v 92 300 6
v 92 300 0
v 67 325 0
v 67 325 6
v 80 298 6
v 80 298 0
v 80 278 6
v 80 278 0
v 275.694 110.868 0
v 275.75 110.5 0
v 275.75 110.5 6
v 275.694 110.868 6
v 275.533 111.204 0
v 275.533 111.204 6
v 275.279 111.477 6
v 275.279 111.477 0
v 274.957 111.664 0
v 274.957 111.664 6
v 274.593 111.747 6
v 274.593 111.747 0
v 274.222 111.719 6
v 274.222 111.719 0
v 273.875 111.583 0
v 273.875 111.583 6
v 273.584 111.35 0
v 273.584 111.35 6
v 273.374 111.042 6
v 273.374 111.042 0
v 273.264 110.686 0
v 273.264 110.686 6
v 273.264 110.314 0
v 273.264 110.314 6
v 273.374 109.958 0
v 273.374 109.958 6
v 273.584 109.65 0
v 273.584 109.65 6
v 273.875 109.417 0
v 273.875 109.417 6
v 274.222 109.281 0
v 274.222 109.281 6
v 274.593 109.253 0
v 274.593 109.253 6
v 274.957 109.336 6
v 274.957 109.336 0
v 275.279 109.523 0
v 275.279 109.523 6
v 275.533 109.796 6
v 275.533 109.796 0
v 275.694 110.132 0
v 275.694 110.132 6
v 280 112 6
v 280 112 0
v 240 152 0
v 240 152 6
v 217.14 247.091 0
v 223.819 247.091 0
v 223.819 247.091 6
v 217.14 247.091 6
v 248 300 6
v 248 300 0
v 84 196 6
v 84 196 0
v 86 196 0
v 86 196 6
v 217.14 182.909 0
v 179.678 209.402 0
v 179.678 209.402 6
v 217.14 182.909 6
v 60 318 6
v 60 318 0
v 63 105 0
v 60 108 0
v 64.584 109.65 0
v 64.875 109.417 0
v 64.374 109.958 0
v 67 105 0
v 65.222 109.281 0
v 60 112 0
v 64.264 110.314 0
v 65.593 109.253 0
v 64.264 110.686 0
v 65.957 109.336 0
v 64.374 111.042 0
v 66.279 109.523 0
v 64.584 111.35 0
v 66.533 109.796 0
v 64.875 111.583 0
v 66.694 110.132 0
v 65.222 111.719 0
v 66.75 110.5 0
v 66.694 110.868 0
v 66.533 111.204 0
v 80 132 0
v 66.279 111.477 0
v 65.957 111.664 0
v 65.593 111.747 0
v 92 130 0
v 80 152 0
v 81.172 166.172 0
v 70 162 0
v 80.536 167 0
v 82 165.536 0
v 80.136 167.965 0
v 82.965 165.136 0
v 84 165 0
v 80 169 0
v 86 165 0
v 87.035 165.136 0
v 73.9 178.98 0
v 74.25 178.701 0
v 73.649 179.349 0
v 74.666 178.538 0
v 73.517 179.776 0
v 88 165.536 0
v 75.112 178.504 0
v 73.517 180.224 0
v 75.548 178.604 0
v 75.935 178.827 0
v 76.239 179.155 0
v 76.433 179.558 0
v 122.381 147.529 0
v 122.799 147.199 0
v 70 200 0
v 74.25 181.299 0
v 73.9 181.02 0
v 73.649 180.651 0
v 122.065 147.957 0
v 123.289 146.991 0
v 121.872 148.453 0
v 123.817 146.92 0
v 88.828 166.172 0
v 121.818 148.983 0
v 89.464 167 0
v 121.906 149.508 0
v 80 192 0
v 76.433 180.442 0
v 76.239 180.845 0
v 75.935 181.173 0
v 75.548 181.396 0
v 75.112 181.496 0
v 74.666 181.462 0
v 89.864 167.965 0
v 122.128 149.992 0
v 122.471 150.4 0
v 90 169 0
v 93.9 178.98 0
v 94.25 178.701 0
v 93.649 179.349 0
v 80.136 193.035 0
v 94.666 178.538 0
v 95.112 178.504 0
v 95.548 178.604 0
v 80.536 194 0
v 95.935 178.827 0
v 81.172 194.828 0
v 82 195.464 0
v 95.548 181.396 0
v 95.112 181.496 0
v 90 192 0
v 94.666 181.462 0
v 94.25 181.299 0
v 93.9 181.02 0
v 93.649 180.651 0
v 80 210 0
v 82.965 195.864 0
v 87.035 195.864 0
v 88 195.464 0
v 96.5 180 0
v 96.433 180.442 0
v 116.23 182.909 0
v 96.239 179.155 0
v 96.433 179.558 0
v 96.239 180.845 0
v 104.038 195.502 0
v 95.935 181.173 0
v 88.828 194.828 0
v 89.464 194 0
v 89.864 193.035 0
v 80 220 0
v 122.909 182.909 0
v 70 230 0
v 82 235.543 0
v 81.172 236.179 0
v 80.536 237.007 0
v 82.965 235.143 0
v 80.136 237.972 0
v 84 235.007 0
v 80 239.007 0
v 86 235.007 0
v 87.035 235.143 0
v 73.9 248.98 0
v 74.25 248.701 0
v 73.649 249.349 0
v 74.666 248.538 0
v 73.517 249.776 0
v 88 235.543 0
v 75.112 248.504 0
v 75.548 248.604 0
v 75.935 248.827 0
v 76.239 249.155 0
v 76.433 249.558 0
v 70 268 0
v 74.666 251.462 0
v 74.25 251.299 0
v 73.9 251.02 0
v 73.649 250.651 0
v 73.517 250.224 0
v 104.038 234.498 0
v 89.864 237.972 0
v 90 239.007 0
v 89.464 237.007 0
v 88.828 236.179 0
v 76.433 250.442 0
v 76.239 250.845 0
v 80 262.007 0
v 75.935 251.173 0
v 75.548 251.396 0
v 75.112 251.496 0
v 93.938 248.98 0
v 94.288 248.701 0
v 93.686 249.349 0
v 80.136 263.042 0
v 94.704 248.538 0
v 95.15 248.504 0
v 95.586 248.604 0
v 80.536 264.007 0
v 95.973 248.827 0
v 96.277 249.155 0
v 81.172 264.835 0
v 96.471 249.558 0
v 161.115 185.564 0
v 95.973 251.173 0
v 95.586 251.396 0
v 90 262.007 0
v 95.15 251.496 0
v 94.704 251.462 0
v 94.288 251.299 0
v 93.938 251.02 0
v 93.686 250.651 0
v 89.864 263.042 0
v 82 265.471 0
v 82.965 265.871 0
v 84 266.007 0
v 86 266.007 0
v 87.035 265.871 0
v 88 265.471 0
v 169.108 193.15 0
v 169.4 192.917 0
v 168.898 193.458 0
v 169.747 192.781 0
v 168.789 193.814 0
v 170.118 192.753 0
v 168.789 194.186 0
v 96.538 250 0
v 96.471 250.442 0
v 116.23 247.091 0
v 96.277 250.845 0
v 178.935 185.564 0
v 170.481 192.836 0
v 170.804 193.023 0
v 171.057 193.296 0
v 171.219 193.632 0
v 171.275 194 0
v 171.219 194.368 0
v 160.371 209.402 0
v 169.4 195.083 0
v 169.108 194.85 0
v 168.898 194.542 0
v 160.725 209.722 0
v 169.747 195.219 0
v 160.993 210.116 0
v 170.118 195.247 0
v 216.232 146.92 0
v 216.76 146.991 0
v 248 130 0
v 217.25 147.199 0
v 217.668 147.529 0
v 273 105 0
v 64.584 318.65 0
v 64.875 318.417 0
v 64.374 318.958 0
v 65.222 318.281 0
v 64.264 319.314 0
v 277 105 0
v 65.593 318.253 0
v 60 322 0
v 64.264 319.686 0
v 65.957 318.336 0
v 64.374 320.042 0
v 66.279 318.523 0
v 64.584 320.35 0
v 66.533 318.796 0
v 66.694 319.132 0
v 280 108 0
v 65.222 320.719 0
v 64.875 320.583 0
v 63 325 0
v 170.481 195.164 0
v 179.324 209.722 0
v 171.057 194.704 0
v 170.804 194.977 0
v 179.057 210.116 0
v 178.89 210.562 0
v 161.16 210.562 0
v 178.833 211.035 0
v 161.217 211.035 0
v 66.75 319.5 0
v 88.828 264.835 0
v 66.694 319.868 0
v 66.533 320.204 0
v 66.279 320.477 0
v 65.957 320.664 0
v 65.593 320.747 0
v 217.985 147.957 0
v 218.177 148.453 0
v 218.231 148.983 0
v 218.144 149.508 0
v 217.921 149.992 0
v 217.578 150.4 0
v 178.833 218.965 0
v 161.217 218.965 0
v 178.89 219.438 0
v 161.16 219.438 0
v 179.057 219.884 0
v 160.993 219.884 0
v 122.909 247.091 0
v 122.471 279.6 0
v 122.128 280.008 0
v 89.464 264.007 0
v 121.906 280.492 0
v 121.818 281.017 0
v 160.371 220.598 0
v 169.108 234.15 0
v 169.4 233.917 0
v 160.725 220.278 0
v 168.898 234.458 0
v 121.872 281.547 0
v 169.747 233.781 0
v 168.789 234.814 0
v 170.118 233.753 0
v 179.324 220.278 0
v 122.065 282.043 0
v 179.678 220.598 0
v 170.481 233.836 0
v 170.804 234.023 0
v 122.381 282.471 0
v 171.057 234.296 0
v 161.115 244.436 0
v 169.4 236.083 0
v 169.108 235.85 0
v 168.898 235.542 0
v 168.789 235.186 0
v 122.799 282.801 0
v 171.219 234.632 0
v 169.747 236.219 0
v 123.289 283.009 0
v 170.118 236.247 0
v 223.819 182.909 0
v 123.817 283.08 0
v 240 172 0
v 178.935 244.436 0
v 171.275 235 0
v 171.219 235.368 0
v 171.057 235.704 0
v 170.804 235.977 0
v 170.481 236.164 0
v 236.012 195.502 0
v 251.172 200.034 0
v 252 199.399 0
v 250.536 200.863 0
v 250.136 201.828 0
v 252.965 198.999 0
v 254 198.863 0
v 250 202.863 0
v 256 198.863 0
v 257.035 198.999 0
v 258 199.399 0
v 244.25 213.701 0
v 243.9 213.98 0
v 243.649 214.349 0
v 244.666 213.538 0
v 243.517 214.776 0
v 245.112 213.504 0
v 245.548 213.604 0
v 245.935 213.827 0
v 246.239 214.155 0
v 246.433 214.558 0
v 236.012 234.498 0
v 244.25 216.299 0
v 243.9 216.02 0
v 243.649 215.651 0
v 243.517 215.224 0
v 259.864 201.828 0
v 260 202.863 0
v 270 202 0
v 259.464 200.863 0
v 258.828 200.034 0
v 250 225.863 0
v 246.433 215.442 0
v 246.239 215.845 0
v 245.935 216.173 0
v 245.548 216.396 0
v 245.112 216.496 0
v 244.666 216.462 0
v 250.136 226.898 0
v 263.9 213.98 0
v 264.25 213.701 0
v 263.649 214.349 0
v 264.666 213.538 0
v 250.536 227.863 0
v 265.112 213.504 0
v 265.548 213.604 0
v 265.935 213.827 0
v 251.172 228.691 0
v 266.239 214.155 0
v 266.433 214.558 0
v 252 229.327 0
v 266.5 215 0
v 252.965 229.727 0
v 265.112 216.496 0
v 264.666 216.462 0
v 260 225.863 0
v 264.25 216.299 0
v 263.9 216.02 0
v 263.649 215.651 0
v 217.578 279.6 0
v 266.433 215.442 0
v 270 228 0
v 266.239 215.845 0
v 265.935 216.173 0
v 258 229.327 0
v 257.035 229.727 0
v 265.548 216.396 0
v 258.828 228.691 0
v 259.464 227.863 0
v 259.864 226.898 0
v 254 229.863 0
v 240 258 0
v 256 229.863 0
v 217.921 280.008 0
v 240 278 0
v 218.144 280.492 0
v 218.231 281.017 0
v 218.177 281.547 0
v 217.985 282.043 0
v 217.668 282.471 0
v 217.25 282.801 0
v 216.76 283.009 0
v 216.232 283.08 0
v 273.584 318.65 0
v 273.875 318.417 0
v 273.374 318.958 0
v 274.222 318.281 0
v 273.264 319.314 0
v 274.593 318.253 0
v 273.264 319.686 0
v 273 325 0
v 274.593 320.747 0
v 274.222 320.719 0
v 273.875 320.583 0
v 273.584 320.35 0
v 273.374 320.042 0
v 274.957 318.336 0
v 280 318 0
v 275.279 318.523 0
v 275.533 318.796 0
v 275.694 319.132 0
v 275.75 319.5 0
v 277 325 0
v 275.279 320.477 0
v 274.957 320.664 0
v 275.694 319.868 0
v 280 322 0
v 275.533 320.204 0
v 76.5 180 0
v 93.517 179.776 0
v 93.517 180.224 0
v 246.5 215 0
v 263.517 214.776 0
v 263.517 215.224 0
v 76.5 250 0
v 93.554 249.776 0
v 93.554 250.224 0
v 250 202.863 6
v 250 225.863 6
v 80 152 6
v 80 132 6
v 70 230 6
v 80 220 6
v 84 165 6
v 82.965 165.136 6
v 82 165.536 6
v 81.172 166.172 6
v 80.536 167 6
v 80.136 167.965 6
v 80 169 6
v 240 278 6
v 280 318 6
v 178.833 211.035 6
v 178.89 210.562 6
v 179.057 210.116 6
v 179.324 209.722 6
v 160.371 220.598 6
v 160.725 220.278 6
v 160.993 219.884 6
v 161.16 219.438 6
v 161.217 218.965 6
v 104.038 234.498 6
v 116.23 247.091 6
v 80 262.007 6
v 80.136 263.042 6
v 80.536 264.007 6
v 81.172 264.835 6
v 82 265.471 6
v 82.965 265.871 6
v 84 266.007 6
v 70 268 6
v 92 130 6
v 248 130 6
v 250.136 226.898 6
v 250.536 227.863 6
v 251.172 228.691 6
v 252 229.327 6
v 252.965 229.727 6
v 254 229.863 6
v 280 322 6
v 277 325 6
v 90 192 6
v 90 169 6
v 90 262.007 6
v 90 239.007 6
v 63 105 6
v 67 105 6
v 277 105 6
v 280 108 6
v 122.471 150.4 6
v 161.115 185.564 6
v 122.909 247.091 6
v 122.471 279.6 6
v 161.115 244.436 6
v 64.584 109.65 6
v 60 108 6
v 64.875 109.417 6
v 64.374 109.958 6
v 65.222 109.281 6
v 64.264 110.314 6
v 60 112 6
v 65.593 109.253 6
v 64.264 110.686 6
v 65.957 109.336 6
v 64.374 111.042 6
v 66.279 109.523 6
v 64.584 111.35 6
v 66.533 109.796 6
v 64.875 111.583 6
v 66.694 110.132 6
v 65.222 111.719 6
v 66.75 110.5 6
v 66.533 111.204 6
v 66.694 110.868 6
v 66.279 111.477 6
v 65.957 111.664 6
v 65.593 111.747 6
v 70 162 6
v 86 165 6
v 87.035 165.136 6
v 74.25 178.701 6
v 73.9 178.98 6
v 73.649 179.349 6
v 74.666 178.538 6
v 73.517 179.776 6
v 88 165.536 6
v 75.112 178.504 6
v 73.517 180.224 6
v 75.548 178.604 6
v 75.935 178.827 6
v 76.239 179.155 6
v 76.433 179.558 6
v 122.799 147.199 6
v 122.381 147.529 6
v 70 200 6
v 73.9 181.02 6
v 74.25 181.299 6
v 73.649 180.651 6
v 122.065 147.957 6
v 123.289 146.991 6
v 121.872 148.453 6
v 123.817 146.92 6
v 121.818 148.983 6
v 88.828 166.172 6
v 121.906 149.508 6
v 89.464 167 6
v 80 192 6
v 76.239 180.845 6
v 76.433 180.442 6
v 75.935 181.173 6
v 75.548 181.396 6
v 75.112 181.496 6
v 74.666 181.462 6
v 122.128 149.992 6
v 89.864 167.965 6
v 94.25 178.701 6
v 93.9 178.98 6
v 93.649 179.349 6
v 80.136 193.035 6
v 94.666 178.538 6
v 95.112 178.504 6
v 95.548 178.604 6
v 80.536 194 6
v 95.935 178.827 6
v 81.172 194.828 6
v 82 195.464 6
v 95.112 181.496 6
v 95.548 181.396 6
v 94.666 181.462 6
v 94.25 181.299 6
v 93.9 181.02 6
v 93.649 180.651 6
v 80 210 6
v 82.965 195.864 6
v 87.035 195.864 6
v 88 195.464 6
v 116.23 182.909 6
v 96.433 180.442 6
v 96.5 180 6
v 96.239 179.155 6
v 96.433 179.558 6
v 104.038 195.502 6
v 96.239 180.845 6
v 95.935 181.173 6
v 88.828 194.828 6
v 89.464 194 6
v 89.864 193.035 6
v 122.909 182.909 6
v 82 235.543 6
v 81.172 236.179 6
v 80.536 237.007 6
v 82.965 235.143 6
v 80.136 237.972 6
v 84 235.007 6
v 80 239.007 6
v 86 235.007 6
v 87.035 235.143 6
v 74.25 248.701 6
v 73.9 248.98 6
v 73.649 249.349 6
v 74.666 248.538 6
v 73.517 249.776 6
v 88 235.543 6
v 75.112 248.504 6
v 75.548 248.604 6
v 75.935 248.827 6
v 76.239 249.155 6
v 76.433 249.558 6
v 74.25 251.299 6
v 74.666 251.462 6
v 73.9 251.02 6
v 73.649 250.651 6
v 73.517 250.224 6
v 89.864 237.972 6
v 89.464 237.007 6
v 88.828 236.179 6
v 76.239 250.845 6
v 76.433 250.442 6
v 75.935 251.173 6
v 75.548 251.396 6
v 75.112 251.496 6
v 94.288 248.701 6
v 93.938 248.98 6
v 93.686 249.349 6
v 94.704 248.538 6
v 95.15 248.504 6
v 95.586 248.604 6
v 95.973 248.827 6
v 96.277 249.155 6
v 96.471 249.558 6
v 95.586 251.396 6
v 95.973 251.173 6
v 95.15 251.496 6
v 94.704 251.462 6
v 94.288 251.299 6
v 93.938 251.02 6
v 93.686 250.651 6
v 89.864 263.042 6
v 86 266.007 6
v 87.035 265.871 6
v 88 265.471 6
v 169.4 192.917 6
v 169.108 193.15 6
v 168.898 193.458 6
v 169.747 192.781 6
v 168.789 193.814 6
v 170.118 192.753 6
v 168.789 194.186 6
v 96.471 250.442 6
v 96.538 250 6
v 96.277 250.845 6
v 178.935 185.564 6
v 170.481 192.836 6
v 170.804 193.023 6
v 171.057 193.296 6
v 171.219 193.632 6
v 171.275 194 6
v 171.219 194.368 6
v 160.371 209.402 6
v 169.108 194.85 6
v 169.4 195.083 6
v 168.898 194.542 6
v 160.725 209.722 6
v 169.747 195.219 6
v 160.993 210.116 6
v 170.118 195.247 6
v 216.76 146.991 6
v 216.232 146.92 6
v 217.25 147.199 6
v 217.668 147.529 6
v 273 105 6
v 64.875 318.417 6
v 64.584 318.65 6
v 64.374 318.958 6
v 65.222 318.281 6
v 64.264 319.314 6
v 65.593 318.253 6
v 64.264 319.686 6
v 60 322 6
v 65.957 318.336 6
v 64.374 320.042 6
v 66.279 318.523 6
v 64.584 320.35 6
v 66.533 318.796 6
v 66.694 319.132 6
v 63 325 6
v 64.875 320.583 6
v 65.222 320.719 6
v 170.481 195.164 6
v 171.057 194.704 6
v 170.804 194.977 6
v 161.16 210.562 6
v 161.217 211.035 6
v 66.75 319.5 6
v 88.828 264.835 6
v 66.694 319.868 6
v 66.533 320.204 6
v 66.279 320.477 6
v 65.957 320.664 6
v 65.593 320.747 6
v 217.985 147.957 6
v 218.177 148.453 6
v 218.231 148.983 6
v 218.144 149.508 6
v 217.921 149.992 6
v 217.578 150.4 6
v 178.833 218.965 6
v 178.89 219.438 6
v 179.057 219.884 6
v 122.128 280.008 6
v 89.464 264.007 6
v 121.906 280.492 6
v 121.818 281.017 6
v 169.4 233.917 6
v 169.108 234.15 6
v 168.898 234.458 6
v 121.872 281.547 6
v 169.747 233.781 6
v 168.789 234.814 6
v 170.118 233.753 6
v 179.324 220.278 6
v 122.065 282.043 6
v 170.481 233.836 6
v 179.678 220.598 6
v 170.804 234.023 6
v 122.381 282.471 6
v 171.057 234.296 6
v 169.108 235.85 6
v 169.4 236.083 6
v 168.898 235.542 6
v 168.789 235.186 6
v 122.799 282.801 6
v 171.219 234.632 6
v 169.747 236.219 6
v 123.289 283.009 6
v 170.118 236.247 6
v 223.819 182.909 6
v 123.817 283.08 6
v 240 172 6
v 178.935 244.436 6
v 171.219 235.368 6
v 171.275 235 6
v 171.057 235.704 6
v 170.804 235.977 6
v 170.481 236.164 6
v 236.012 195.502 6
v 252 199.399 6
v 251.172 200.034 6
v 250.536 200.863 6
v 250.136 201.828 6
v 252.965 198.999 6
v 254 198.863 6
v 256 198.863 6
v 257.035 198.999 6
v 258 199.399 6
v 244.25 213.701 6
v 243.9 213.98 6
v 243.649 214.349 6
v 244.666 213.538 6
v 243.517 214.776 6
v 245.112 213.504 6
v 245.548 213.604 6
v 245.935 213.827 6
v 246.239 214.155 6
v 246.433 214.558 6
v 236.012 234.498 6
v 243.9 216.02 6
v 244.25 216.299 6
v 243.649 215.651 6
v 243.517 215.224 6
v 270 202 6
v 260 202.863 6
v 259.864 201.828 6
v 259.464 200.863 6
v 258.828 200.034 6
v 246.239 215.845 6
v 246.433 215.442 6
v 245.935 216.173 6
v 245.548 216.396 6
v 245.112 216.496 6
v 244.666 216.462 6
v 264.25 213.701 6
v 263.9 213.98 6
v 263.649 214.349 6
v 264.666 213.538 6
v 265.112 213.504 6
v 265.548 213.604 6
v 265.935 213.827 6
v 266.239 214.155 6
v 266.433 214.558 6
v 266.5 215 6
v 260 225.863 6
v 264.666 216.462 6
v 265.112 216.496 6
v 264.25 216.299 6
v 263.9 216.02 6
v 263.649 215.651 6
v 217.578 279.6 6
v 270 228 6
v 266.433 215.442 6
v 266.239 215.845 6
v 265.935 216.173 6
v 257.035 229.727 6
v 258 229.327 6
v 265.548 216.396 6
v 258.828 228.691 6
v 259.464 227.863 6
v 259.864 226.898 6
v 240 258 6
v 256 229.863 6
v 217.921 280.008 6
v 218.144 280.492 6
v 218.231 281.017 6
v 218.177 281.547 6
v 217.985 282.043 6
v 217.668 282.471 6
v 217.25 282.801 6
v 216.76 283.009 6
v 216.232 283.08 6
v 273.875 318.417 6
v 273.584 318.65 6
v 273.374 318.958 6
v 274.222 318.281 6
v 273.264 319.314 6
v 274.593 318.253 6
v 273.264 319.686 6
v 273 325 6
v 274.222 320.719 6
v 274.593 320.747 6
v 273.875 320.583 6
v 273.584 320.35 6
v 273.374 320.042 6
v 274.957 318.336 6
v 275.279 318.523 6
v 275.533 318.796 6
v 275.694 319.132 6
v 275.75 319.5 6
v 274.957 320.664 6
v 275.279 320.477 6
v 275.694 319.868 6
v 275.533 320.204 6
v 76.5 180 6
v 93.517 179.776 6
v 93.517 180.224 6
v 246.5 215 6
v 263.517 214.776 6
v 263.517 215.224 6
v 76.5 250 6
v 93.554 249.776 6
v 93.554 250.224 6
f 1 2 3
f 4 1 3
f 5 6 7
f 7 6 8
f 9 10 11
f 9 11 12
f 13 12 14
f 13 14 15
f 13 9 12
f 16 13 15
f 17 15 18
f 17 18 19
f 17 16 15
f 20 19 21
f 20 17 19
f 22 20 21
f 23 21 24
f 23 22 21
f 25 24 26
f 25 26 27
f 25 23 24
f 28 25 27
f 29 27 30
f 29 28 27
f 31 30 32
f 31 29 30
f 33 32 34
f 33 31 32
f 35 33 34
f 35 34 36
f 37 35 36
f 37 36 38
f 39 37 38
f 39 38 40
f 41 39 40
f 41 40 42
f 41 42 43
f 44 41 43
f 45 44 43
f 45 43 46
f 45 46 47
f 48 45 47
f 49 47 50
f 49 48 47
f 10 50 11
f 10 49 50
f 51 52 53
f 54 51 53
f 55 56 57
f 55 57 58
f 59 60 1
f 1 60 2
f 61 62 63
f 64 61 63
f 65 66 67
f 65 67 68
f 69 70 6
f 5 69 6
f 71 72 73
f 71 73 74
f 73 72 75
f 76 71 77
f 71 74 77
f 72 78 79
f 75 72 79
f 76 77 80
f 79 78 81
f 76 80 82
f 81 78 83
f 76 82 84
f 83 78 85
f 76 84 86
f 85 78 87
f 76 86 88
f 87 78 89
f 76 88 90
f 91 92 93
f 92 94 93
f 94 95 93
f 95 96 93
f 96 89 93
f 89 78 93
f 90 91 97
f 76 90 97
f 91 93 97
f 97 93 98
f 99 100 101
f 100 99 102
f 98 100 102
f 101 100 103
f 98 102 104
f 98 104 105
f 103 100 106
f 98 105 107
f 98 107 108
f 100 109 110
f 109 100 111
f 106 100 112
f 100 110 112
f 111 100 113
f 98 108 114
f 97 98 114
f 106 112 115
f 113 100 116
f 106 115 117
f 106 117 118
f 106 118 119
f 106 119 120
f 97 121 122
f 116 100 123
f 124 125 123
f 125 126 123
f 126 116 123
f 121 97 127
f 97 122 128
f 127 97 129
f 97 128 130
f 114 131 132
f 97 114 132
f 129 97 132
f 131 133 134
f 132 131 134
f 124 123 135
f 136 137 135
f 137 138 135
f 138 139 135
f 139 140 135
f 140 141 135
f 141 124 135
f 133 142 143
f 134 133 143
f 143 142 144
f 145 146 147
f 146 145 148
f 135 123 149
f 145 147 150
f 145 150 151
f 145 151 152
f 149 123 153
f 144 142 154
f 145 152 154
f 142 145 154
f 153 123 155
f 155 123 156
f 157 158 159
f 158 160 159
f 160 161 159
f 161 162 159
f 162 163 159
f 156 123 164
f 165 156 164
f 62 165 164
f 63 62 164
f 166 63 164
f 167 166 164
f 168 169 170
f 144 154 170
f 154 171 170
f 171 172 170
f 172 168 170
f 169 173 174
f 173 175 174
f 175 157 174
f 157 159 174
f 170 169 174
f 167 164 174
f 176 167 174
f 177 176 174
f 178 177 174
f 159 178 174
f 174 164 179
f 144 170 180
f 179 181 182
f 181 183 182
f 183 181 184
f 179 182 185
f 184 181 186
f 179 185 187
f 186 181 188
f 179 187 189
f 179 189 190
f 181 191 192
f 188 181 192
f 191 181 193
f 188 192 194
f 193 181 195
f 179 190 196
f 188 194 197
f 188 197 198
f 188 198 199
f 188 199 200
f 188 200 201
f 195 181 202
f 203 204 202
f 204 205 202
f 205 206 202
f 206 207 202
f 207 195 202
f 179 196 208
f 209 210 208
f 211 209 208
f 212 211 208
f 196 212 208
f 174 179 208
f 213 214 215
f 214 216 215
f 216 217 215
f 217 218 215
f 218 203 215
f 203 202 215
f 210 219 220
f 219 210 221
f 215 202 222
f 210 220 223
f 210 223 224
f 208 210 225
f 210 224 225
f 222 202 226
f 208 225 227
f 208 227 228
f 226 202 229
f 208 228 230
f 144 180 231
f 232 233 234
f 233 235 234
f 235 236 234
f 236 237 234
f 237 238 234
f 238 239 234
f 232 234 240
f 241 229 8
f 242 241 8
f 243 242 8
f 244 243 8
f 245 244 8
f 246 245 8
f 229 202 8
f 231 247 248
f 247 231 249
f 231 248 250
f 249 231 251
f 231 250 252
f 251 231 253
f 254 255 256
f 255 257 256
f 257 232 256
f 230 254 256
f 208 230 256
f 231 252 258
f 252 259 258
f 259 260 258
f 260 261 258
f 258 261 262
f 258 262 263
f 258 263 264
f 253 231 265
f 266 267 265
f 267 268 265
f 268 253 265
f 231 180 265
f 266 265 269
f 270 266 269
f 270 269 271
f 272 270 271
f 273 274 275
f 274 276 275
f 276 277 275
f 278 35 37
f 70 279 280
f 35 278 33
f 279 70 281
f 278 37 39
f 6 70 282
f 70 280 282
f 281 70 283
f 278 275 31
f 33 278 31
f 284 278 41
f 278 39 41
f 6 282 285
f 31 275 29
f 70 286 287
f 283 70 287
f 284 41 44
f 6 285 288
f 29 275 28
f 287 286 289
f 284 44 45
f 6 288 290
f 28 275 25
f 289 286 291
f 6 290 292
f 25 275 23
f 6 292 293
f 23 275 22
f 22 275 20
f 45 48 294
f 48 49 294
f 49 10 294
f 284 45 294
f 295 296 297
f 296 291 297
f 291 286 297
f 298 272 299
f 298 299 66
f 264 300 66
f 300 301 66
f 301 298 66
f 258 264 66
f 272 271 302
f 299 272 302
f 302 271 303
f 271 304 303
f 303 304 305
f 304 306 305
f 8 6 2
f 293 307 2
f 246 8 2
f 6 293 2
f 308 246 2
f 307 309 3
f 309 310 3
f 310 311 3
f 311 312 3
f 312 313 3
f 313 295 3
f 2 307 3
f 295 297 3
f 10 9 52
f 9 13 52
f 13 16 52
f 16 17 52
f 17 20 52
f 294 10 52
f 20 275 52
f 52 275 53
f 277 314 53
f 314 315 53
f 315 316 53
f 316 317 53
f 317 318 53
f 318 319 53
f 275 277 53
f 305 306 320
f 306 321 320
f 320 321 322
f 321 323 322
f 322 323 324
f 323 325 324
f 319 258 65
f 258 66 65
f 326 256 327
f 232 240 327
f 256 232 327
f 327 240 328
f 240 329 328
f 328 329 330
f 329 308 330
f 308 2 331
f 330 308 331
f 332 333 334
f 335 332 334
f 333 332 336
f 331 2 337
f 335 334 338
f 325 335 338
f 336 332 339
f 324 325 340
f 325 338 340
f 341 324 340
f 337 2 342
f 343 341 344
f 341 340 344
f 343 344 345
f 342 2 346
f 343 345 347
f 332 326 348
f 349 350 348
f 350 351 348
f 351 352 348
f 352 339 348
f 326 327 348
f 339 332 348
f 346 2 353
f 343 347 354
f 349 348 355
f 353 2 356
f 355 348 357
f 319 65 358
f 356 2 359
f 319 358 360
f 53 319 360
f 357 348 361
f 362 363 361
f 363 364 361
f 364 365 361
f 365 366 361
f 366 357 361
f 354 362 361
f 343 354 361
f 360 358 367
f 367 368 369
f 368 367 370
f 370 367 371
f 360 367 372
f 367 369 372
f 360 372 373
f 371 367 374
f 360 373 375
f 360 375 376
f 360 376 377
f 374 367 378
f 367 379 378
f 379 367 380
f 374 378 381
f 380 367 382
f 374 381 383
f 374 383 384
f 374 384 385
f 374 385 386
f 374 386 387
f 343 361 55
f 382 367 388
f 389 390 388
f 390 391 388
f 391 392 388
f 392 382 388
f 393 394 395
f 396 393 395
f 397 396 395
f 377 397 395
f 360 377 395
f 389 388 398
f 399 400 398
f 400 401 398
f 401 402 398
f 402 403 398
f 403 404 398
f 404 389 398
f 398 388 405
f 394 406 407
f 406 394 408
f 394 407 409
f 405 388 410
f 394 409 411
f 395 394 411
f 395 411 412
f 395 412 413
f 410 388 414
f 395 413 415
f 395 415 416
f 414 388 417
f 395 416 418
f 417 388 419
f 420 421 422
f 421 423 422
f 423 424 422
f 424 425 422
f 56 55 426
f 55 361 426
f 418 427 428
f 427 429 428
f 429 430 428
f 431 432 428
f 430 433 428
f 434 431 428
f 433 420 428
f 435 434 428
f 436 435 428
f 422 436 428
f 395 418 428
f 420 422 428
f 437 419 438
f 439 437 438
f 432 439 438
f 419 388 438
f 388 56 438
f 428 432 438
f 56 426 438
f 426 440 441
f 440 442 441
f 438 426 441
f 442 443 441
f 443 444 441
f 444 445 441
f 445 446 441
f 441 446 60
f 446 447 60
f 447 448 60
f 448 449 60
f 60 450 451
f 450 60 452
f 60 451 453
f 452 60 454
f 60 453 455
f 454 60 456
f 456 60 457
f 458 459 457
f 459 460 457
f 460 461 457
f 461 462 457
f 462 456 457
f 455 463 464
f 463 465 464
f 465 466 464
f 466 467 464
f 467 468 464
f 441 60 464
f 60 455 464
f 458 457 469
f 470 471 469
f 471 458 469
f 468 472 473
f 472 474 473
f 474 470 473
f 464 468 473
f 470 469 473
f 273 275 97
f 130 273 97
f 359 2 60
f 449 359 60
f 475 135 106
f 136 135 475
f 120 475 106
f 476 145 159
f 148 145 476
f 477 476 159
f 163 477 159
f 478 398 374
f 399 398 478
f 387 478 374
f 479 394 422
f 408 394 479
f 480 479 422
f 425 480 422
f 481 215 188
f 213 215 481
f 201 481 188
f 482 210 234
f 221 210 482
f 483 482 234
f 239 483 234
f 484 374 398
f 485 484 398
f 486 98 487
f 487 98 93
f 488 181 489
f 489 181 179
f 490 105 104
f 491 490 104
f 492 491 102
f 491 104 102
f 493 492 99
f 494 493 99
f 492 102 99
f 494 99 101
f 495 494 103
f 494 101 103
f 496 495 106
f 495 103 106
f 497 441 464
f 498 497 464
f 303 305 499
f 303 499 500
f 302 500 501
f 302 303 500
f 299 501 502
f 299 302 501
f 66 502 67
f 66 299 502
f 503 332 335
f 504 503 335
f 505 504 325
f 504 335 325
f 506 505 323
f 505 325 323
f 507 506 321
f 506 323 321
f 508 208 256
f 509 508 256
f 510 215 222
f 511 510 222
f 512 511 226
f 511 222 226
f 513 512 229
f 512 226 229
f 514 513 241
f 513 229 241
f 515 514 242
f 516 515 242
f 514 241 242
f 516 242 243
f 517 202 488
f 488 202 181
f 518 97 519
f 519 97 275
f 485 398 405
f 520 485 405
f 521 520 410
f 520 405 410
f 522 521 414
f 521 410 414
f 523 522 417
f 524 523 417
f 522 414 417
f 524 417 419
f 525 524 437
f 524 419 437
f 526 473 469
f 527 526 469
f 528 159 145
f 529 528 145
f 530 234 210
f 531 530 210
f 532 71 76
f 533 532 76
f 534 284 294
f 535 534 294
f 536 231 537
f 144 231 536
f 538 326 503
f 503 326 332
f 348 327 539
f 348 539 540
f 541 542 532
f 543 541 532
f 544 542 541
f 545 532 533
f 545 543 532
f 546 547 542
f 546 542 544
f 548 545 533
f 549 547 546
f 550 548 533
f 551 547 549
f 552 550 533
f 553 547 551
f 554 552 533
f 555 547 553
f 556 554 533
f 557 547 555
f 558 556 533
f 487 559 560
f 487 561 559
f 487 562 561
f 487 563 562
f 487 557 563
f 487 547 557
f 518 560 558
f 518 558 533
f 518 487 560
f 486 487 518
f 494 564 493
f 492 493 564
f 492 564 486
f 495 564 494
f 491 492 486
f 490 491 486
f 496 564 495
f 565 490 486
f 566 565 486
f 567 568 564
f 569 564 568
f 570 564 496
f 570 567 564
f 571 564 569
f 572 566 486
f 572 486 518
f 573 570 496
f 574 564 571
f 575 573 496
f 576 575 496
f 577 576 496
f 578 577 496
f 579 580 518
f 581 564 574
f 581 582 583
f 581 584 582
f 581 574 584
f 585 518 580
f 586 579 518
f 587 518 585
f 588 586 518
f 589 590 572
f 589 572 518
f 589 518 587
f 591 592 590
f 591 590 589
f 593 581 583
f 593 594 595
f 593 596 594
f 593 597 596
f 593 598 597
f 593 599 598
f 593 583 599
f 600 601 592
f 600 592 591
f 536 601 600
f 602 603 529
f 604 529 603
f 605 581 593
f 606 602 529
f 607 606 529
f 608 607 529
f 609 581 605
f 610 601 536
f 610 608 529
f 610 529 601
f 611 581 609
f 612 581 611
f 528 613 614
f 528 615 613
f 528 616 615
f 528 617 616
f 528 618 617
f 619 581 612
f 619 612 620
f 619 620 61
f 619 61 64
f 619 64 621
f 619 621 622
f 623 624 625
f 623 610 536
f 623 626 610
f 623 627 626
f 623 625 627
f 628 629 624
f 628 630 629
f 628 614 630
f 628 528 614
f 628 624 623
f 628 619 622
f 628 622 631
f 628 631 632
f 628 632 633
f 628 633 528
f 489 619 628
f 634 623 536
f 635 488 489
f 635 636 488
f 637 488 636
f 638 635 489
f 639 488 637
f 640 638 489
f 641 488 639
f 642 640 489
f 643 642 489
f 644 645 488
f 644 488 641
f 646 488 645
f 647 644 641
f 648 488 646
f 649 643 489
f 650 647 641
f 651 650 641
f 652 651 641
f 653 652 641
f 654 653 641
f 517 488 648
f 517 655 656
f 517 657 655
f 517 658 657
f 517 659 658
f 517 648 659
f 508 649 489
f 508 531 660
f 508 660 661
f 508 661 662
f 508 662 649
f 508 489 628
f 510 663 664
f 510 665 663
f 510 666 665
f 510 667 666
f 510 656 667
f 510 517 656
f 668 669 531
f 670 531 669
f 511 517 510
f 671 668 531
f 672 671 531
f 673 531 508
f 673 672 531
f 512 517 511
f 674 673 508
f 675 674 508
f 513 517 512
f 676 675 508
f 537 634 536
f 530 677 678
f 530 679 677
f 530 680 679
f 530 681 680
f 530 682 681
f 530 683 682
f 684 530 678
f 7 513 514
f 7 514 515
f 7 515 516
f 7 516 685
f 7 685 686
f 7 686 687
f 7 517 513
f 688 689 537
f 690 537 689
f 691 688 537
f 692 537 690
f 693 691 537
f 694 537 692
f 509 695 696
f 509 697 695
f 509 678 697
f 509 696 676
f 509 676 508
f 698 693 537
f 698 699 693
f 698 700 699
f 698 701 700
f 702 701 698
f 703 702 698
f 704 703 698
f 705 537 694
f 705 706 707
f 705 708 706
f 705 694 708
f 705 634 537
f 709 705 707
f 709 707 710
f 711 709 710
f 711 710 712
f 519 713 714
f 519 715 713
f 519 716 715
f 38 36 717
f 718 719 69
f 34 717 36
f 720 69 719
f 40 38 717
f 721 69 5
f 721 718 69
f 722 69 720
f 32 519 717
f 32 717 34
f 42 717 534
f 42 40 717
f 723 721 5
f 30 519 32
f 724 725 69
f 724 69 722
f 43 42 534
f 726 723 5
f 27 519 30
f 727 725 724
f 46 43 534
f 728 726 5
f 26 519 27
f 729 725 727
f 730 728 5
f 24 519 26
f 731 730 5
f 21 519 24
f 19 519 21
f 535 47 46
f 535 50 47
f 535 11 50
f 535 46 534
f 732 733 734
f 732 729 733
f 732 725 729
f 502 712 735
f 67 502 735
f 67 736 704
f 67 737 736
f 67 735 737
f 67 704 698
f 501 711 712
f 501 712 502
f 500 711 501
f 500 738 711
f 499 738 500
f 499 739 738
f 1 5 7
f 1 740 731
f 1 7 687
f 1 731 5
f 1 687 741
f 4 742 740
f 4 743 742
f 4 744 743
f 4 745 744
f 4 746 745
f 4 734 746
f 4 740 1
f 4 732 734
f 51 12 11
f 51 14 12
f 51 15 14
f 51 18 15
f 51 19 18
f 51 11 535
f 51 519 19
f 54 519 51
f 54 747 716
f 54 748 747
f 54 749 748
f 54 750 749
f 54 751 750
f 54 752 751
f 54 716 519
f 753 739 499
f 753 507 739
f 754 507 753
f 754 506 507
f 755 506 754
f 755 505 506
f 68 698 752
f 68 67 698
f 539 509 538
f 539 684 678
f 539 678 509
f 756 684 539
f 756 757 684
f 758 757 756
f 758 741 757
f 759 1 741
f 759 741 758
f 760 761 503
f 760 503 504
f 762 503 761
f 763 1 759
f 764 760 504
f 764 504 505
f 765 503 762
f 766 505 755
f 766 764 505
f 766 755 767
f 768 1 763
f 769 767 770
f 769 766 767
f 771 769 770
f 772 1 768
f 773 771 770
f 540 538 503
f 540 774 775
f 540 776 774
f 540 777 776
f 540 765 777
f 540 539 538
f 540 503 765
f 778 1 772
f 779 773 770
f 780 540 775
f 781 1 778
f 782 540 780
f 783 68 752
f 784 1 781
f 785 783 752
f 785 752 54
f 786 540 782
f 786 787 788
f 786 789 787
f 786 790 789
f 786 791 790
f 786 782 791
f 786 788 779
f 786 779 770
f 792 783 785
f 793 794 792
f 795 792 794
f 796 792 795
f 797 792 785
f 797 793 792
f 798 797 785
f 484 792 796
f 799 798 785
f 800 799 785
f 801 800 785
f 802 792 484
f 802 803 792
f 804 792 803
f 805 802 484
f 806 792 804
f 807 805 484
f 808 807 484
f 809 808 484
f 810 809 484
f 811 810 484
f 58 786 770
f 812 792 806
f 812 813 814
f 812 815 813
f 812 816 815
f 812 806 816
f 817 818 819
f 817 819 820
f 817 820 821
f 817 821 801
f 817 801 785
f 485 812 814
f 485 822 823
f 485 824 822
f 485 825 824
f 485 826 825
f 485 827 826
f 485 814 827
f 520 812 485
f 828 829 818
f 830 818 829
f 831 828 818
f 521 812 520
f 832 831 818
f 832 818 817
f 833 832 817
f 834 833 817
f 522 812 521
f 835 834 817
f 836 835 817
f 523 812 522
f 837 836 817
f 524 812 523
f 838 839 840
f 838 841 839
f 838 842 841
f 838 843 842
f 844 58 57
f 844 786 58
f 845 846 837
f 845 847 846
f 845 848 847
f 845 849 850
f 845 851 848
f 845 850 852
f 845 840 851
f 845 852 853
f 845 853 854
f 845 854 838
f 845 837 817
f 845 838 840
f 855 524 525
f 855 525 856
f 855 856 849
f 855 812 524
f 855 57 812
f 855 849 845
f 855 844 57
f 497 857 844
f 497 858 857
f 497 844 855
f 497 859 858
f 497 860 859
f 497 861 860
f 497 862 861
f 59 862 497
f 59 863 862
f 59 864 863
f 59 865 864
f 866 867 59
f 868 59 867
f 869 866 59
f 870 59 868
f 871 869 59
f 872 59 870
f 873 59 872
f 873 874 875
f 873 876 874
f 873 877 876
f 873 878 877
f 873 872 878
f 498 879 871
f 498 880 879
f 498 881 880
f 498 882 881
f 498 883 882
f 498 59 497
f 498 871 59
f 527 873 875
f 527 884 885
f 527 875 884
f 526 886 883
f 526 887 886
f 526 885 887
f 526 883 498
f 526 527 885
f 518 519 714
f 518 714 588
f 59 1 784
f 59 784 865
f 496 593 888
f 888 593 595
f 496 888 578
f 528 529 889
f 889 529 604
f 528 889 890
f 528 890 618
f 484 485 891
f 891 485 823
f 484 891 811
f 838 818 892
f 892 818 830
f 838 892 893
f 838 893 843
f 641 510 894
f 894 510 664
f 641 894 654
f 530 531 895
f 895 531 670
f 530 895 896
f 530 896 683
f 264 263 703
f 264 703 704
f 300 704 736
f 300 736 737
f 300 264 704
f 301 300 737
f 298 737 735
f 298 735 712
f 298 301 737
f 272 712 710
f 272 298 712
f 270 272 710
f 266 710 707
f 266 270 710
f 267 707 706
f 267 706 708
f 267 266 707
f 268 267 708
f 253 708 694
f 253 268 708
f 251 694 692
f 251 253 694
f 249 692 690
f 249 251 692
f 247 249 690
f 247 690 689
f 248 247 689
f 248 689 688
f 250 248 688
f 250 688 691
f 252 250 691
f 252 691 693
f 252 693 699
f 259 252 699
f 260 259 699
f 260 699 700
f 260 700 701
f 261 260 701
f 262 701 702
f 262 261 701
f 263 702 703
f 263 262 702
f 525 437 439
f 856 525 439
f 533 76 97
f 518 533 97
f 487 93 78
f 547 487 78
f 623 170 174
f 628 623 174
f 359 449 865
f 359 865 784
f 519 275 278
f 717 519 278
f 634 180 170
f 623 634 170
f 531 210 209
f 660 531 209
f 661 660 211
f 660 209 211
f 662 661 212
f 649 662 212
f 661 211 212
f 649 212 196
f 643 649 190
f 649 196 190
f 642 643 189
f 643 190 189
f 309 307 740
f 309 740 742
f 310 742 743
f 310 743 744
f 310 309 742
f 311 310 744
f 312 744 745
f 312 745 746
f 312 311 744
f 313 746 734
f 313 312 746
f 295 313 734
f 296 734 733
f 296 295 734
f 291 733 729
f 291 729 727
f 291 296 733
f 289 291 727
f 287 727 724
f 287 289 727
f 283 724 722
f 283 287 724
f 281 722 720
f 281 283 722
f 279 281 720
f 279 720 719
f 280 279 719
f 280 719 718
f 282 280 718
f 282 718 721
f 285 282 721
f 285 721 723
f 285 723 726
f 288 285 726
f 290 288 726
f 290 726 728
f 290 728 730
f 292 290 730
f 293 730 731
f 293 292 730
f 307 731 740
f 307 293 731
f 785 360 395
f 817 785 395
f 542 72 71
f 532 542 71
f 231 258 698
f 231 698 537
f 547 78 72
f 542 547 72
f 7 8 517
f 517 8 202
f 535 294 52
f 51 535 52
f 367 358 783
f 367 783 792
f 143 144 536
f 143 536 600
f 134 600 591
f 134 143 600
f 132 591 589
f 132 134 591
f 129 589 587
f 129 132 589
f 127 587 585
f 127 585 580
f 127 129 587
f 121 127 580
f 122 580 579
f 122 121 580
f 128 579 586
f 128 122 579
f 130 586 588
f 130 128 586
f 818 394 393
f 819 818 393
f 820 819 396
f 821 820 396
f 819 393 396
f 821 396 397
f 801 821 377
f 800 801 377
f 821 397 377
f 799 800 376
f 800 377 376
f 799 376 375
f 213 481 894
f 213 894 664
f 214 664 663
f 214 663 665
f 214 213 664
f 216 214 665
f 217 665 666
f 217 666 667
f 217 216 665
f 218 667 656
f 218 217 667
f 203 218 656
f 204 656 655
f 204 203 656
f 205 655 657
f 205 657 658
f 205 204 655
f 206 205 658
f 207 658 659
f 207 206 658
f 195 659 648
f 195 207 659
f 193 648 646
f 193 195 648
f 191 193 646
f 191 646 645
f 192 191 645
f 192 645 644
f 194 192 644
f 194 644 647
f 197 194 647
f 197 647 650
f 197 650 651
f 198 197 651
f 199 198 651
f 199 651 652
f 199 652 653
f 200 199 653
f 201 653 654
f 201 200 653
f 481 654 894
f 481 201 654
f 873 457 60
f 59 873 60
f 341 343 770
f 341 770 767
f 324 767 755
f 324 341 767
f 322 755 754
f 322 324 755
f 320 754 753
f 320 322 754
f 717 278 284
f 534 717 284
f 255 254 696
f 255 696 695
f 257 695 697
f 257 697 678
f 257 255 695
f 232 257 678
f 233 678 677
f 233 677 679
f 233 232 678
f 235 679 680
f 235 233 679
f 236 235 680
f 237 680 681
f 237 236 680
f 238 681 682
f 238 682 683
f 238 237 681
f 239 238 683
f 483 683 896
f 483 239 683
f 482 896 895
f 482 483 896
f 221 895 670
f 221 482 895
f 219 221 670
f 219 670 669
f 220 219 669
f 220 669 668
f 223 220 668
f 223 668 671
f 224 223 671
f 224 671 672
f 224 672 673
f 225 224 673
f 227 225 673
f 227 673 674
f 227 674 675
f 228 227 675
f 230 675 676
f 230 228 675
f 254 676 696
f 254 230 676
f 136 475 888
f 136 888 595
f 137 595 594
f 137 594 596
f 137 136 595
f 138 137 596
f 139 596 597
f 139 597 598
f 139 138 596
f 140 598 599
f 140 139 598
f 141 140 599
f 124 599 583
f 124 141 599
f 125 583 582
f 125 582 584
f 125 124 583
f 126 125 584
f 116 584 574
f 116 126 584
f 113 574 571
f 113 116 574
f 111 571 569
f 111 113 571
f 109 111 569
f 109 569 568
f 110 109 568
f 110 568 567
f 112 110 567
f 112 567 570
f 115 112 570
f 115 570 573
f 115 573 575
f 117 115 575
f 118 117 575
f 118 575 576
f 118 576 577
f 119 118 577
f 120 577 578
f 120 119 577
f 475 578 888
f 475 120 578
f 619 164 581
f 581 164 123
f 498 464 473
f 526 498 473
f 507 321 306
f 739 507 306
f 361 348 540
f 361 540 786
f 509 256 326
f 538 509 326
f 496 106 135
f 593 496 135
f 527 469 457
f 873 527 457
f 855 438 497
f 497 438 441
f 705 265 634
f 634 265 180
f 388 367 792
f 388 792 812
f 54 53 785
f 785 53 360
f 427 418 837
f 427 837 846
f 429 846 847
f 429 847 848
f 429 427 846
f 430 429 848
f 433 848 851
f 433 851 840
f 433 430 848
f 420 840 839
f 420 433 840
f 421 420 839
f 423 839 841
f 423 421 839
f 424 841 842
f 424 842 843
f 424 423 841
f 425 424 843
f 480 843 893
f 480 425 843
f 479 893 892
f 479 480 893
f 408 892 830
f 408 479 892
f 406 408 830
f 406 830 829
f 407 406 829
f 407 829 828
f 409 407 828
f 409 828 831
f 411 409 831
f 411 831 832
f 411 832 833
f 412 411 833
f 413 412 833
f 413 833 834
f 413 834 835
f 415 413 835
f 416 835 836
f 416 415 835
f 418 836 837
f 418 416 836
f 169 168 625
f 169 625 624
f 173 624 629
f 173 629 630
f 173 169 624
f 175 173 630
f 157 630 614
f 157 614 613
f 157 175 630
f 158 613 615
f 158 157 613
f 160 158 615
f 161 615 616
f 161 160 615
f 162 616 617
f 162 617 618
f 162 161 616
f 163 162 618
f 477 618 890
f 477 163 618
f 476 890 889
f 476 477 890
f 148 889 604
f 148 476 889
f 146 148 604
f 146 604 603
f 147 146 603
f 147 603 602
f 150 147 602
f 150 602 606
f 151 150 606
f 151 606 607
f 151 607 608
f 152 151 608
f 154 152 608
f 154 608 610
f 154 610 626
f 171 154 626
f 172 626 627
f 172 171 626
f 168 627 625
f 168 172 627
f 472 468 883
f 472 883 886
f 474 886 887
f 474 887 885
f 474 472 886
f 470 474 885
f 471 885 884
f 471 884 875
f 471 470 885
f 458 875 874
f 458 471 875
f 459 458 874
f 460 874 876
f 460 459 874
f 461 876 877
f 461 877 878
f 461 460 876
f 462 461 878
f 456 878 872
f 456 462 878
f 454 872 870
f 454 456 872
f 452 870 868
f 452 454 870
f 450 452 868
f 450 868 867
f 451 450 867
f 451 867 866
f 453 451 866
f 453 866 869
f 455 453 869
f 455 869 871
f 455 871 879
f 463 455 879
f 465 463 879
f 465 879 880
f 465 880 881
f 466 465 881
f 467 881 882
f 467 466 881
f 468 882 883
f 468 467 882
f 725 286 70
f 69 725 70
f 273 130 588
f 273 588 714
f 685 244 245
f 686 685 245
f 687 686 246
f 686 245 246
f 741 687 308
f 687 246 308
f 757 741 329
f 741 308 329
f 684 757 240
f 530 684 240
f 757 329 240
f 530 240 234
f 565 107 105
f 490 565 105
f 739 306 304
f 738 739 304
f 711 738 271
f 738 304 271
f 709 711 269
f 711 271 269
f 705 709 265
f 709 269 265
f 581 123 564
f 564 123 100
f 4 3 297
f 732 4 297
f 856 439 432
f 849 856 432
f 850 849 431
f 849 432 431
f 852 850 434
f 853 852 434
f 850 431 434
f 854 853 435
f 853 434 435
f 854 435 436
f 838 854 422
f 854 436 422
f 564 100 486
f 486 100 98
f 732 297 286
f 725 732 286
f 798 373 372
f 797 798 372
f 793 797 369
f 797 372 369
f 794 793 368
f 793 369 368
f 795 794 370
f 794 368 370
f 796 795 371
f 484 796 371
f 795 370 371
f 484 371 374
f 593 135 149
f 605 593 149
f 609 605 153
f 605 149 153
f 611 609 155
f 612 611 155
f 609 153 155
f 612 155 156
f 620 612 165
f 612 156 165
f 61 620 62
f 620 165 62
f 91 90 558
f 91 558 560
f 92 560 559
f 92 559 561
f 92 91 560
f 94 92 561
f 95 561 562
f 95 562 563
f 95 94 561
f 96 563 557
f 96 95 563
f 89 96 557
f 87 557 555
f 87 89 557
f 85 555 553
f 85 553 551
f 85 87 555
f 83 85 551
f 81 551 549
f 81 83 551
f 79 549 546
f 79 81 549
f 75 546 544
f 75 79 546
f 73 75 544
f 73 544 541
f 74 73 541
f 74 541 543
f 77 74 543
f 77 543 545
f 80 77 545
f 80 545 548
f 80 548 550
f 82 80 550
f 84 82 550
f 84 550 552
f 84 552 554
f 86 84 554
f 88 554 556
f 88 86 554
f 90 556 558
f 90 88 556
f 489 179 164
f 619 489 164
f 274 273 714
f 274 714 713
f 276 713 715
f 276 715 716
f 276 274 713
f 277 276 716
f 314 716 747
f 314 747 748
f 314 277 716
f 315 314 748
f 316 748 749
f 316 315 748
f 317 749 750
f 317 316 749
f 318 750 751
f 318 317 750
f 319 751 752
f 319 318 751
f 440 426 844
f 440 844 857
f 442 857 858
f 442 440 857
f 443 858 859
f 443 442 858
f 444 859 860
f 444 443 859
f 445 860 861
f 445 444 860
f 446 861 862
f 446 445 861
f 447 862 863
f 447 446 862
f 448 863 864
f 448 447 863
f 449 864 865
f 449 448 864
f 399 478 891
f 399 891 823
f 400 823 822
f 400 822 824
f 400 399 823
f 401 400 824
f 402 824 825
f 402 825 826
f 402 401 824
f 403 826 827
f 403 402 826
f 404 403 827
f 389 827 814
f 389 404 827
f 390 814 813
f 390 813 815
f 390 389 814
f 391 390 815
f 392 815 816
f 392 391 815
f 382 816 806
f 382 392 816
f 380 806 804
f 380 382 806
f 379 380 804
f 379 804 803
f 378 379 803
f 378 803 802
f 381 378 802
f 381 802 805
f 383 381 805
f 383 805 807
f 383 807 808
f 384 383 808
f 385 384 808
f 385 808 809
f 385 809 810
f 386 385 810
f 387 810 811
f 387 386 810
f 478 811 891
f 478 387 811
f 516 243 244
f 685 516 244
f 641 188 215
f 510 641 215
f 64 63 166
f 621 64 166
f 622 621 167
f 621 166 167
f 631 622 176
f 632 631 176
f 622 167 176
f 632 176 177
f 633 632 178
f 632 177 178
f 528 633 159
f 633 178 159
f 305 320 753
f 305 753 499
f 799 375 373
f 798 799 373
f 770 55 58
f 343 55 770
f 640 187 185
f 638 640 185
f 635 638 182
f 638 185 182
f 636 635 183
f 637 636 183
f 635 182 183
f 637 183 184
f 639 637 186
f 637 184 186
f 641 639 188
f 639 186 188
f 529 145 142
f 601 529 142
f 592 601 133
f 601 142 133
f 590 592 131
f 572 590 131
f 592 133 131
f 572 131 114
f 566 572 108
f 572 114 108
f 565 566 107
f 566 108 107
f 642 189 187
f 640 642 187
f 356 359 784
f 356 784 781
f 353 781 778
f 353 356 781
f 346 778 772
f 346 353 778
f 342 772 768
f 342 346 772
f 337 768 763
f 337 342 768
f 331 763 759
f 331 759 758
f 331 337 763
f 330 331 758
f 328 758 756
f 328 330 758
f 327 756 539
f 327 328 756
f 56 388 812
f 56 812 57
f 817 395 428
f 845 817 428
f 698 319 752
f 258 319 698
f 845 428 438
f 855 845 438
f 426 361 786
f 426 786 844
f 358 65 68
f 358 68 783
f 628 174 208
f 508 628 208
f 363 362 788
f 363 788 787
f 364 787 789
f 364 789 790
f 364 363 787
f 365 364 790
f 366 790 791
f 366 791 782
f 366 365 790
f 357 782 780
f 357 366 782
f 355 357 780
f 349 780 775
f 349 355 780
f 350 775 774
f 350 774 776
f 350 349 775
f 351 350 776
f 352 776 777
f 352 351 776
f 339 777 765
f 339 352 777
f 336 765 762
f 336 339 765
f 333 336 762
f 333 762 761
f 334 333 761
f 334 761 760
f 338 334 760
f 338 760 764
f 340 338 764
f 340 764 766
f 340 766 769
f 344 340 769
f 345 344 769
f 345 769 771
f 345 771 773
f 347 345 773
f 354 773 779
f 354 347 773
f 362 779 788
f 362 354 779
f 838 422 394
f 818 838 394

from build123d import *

# Parameters (mm, degrees)
FRAME_R             = 1.5
FRAME_R_2           = 1.25
BOSS_EXTRUDE1_DEPTH = 6


with BuildPart() as part:
    # FRAME → Boss-Extrude1 (new body)
    with BuildSketch(Plane.XY):
        Polygon((65, 325), (63, 325), (60, 322), (60, 320), (60, 318), (80, 298), (80, 278), (70, 268), (70, 230), (80, 220), (80, 210), (70, 200), (70, 162), (80, 152), (80, 132), (60, 112), (60, 108), (63, 105), (65, 105), (67, 105), (92, 130), (248, 130), (273, 105), (275, 105), (277, 105), (280, 108), (280, 112), (260, 132), (240, 152), (240, 172), (260, 192), (270, 202), (270, 228), (260, 238), (240, 258), (240, 278), (280, 318), (280, 321), (280, 322), (277, 325), (273, 325), (250, 302), (248, 300), (92, 300), (67, 325), align=None)
        with Locations((75, 250)):
            Circle(FRAME_R, mode=Mode.SUBTRACT)
        with Locations((95.037619408, 250)):
            Circle(FRAME_R, mode=Mode.SUBTRACT)
        with Locations((75, 180)):
            Circle(FRAME_R, mode=Mode.SUBTRACT)
        with Locations((95, 180)):
            Circle(FRAME_R, mode=Mode.SUBTRACT)
        with Locations((265, 215)):
            Circle(FRAME_R, mode=Mode.SUBTRACT)
        with Locations((245, 215)):
            Circle(FRAME_R, mode=Mode.SUBTRACT)
        with Locations((65.5, 319.5)):
            Circle(FRAME_R_2, mode=Mode.SUBTRACT)
        with Locations((274.5, 110.5)):
            Circle(FRAME_R_2, mode=Mode.SUBTRACT)
        with Locations((274.5, 319.5)):
            Circle(FRAME_R_2, mode=Mode.SUBTRACT)
        with Locations((65.5, 110.5)):
            Circle(FRAME_R_2, mode=Mode.SUBTRACT)
        with Locations((170.024675872, 194)):
            Circle(FRAME_R_2, mode=Mode.SUBTRACT)
        with Locations((170.024675872, 235)):
            Circle(FRAME_R_2, mode=Mode.SUBTRACT)
        with BuildLine():
            Line((161.216590497, 218.964796722), (161.216590497, 211.035203278))
            ThreePointArc((161.216590497, 211.035203278), (160.992764596, 210.115852653), (160.371384926, 209.402276511))
            Line((160.371384926, 209.402276511), (122.909474642, 182.909474642))
            Line((122.909474642, 182.909474642), (116.23015359, 182.909474642))
            Line((116.23015359, 182.909474642), (104.037619408, 195.501934511))
            Line((104.037619408, 195.501934511), (104.037619408, 234.498065489))
            Line((104.037619408, 234.498065489), (116.23015359, 247.090525358))
            Line((116.23015359, 247.090525358), (122.909474642, 247.090525358))
            Line((122.909474642, 247.090525358), (160.371384926, 220.597723489))
            ThreePointArc((160.371384926, 220.597723489), (160.992764596, 219.884147347), (161.216590497, 218.964796722))
        make_face(mode=Mode.SUBTRACT)
        with BuildLine():
            Line((122.471056888, 279.600410825), (161.114699893, 244.435797428))
            Line((161.114699893, 244.435797428), (178.934651851, 244.435797428))
            Line((178.934651851, 244.435797428), (217.578294856, 279.600410825))
            ThreePointArc((217.578294856, 279.600410825), (218.0975061, 281.801285282), (216.232236245, 283.079642455))
            Line((216.232236245, 283.079642455), (123.817115499, 283.079642455))
            ThreePointArc((123.817115499, 283.079642455), (121.951845644, 281.801285282), (122.471056888, 279.600410825))
        make_face(mode=Mode.SUBTRACT)
        with BuildLine():
            Line((217.139877102, 247.090525358), (179.677966818, 220.597723489))
            ThreePointArc((179.677966818, 220.597723489), (179.056587148, 219.884147347), (178.832761247, 218.964796722))
            Line((178.832761247, 218.964796722), (178.832761247, 211.035203278))
            ThreePointArc((178.832761247, 211.035203278), (179.056587148, 210.115852653), (179.677966818, 209.402276511))
            Line((179.677966818, 209.402276511), (217.139877102, 182.909474642))
            Line((217.139877102, 182.909474642), (223.819198154, 182.909474642))
            Line((223.819198154, 182.909474642), (236.011732336, 195.501934511))
            Line((236.011732336, 195.501934511), (236.011732336, 234.498065489))
            Line((236.011732336, 234.498065489), (223.819198154, 247.090525358))
            Line((223.819198154, 247.090525358), (217.139877102, 247.090525358))
        make_face(mode=Mode.SUBTRACT)
        with BuildLine():
            Line((217.578294856, 150.399589175), (178.934651851, 185.564202572))
            Line((178.934651851, 185.564202572), (161.114699893, 185.564202572))
            Line((161.114699893, 185.564202572), (122.471056888, 150.399589175))
            ThreePointArc((122.471056888, 150.399589175), (121.951845644, 148.198714718), (123.817115499, 146.920357545))
            Line((123.817115499, 146.920357545), (216.232236245, 146.920357545))
            ThreePointArc((216.232236245, 146.920357545), (218.0975061, 148.198714718), (217.578294856, 150.399589175))
        make_face(mode=Mode.SUBTRACT)
        with BuildLine():
            Line((80, 169), (80, 192))
            ThreePointArc((80, 192), (81.171572875, 194.828427125), (84, 196))
            Line((84, 196), (86, 196))
            ThreePointArc((86, 196), (88.828427125, 194.828427125), (90, 192))
            Line((90, 192), (90, 169))
            ThreePointArc((90, 169), (88.828427125, 166.171572875), (86, 165))
            Line((86, 165), (84, 165))
            ThreePointArc((84, 165), (81.171572875, 166.171572875), (80, 169))
        make_face(mode=Mode.SUBTRACT)
        with BuildLine():
            Line((80, 239.007036896), (80, 262.007036896))
            ThreePointArc((80, 262.007036896), (81.171572875, 264.835464021), (84, 266.007036896))
            Line((84, 266.007036896), (86, 266.007036896))
            ThreePointArc((86, 266.007036896), (88.828427125, 264.835464021), (90, 262.007036896))
            Line((90, 262.007036896), (90, 239.007036896))
            ThreePointArc((90, 239.007036896), (88.828427125, 236.178609771), (86, 235.007036896))
            Line((86, 235.007036896), (84, 235.007036896))
            ThreePointArc((84, 235.007036896), (81.171572875, 236.178609771), (80, 239.007036896))
        make_face(mode=Mode.SUBTRACT)
        with BuildLine():
            Line((250, 202.862876393), (250, 225.862876393))
            ThreePointArc((250, 225.862876393), (251.171572875, 228.691303518), (254, 229.862876393))
            Line((254, 229.862876393), (256, 229.862876393))
            ThreePointArc((256, 229.862876393), (258.828427125, 228.691303518), (260, 225.862876393))
            Line((260, 225.862876393), (260, 202.862876393))
            ThreePointArc((260, 202.862876393), (258.828427125, 200.034449268), (256, 198.862876393))
            Line((256, 198.862876393), (254, 198.862876393))
            ThreePointArc((254, 198.862876393), (251.171572875, 200.034449268), (250, 202.862876393))
        make_face(mode=Mode.SUBTRACT)
    extrude(amount=BOSS_EXTRUDE1_DEPTH)


solid = part.part
